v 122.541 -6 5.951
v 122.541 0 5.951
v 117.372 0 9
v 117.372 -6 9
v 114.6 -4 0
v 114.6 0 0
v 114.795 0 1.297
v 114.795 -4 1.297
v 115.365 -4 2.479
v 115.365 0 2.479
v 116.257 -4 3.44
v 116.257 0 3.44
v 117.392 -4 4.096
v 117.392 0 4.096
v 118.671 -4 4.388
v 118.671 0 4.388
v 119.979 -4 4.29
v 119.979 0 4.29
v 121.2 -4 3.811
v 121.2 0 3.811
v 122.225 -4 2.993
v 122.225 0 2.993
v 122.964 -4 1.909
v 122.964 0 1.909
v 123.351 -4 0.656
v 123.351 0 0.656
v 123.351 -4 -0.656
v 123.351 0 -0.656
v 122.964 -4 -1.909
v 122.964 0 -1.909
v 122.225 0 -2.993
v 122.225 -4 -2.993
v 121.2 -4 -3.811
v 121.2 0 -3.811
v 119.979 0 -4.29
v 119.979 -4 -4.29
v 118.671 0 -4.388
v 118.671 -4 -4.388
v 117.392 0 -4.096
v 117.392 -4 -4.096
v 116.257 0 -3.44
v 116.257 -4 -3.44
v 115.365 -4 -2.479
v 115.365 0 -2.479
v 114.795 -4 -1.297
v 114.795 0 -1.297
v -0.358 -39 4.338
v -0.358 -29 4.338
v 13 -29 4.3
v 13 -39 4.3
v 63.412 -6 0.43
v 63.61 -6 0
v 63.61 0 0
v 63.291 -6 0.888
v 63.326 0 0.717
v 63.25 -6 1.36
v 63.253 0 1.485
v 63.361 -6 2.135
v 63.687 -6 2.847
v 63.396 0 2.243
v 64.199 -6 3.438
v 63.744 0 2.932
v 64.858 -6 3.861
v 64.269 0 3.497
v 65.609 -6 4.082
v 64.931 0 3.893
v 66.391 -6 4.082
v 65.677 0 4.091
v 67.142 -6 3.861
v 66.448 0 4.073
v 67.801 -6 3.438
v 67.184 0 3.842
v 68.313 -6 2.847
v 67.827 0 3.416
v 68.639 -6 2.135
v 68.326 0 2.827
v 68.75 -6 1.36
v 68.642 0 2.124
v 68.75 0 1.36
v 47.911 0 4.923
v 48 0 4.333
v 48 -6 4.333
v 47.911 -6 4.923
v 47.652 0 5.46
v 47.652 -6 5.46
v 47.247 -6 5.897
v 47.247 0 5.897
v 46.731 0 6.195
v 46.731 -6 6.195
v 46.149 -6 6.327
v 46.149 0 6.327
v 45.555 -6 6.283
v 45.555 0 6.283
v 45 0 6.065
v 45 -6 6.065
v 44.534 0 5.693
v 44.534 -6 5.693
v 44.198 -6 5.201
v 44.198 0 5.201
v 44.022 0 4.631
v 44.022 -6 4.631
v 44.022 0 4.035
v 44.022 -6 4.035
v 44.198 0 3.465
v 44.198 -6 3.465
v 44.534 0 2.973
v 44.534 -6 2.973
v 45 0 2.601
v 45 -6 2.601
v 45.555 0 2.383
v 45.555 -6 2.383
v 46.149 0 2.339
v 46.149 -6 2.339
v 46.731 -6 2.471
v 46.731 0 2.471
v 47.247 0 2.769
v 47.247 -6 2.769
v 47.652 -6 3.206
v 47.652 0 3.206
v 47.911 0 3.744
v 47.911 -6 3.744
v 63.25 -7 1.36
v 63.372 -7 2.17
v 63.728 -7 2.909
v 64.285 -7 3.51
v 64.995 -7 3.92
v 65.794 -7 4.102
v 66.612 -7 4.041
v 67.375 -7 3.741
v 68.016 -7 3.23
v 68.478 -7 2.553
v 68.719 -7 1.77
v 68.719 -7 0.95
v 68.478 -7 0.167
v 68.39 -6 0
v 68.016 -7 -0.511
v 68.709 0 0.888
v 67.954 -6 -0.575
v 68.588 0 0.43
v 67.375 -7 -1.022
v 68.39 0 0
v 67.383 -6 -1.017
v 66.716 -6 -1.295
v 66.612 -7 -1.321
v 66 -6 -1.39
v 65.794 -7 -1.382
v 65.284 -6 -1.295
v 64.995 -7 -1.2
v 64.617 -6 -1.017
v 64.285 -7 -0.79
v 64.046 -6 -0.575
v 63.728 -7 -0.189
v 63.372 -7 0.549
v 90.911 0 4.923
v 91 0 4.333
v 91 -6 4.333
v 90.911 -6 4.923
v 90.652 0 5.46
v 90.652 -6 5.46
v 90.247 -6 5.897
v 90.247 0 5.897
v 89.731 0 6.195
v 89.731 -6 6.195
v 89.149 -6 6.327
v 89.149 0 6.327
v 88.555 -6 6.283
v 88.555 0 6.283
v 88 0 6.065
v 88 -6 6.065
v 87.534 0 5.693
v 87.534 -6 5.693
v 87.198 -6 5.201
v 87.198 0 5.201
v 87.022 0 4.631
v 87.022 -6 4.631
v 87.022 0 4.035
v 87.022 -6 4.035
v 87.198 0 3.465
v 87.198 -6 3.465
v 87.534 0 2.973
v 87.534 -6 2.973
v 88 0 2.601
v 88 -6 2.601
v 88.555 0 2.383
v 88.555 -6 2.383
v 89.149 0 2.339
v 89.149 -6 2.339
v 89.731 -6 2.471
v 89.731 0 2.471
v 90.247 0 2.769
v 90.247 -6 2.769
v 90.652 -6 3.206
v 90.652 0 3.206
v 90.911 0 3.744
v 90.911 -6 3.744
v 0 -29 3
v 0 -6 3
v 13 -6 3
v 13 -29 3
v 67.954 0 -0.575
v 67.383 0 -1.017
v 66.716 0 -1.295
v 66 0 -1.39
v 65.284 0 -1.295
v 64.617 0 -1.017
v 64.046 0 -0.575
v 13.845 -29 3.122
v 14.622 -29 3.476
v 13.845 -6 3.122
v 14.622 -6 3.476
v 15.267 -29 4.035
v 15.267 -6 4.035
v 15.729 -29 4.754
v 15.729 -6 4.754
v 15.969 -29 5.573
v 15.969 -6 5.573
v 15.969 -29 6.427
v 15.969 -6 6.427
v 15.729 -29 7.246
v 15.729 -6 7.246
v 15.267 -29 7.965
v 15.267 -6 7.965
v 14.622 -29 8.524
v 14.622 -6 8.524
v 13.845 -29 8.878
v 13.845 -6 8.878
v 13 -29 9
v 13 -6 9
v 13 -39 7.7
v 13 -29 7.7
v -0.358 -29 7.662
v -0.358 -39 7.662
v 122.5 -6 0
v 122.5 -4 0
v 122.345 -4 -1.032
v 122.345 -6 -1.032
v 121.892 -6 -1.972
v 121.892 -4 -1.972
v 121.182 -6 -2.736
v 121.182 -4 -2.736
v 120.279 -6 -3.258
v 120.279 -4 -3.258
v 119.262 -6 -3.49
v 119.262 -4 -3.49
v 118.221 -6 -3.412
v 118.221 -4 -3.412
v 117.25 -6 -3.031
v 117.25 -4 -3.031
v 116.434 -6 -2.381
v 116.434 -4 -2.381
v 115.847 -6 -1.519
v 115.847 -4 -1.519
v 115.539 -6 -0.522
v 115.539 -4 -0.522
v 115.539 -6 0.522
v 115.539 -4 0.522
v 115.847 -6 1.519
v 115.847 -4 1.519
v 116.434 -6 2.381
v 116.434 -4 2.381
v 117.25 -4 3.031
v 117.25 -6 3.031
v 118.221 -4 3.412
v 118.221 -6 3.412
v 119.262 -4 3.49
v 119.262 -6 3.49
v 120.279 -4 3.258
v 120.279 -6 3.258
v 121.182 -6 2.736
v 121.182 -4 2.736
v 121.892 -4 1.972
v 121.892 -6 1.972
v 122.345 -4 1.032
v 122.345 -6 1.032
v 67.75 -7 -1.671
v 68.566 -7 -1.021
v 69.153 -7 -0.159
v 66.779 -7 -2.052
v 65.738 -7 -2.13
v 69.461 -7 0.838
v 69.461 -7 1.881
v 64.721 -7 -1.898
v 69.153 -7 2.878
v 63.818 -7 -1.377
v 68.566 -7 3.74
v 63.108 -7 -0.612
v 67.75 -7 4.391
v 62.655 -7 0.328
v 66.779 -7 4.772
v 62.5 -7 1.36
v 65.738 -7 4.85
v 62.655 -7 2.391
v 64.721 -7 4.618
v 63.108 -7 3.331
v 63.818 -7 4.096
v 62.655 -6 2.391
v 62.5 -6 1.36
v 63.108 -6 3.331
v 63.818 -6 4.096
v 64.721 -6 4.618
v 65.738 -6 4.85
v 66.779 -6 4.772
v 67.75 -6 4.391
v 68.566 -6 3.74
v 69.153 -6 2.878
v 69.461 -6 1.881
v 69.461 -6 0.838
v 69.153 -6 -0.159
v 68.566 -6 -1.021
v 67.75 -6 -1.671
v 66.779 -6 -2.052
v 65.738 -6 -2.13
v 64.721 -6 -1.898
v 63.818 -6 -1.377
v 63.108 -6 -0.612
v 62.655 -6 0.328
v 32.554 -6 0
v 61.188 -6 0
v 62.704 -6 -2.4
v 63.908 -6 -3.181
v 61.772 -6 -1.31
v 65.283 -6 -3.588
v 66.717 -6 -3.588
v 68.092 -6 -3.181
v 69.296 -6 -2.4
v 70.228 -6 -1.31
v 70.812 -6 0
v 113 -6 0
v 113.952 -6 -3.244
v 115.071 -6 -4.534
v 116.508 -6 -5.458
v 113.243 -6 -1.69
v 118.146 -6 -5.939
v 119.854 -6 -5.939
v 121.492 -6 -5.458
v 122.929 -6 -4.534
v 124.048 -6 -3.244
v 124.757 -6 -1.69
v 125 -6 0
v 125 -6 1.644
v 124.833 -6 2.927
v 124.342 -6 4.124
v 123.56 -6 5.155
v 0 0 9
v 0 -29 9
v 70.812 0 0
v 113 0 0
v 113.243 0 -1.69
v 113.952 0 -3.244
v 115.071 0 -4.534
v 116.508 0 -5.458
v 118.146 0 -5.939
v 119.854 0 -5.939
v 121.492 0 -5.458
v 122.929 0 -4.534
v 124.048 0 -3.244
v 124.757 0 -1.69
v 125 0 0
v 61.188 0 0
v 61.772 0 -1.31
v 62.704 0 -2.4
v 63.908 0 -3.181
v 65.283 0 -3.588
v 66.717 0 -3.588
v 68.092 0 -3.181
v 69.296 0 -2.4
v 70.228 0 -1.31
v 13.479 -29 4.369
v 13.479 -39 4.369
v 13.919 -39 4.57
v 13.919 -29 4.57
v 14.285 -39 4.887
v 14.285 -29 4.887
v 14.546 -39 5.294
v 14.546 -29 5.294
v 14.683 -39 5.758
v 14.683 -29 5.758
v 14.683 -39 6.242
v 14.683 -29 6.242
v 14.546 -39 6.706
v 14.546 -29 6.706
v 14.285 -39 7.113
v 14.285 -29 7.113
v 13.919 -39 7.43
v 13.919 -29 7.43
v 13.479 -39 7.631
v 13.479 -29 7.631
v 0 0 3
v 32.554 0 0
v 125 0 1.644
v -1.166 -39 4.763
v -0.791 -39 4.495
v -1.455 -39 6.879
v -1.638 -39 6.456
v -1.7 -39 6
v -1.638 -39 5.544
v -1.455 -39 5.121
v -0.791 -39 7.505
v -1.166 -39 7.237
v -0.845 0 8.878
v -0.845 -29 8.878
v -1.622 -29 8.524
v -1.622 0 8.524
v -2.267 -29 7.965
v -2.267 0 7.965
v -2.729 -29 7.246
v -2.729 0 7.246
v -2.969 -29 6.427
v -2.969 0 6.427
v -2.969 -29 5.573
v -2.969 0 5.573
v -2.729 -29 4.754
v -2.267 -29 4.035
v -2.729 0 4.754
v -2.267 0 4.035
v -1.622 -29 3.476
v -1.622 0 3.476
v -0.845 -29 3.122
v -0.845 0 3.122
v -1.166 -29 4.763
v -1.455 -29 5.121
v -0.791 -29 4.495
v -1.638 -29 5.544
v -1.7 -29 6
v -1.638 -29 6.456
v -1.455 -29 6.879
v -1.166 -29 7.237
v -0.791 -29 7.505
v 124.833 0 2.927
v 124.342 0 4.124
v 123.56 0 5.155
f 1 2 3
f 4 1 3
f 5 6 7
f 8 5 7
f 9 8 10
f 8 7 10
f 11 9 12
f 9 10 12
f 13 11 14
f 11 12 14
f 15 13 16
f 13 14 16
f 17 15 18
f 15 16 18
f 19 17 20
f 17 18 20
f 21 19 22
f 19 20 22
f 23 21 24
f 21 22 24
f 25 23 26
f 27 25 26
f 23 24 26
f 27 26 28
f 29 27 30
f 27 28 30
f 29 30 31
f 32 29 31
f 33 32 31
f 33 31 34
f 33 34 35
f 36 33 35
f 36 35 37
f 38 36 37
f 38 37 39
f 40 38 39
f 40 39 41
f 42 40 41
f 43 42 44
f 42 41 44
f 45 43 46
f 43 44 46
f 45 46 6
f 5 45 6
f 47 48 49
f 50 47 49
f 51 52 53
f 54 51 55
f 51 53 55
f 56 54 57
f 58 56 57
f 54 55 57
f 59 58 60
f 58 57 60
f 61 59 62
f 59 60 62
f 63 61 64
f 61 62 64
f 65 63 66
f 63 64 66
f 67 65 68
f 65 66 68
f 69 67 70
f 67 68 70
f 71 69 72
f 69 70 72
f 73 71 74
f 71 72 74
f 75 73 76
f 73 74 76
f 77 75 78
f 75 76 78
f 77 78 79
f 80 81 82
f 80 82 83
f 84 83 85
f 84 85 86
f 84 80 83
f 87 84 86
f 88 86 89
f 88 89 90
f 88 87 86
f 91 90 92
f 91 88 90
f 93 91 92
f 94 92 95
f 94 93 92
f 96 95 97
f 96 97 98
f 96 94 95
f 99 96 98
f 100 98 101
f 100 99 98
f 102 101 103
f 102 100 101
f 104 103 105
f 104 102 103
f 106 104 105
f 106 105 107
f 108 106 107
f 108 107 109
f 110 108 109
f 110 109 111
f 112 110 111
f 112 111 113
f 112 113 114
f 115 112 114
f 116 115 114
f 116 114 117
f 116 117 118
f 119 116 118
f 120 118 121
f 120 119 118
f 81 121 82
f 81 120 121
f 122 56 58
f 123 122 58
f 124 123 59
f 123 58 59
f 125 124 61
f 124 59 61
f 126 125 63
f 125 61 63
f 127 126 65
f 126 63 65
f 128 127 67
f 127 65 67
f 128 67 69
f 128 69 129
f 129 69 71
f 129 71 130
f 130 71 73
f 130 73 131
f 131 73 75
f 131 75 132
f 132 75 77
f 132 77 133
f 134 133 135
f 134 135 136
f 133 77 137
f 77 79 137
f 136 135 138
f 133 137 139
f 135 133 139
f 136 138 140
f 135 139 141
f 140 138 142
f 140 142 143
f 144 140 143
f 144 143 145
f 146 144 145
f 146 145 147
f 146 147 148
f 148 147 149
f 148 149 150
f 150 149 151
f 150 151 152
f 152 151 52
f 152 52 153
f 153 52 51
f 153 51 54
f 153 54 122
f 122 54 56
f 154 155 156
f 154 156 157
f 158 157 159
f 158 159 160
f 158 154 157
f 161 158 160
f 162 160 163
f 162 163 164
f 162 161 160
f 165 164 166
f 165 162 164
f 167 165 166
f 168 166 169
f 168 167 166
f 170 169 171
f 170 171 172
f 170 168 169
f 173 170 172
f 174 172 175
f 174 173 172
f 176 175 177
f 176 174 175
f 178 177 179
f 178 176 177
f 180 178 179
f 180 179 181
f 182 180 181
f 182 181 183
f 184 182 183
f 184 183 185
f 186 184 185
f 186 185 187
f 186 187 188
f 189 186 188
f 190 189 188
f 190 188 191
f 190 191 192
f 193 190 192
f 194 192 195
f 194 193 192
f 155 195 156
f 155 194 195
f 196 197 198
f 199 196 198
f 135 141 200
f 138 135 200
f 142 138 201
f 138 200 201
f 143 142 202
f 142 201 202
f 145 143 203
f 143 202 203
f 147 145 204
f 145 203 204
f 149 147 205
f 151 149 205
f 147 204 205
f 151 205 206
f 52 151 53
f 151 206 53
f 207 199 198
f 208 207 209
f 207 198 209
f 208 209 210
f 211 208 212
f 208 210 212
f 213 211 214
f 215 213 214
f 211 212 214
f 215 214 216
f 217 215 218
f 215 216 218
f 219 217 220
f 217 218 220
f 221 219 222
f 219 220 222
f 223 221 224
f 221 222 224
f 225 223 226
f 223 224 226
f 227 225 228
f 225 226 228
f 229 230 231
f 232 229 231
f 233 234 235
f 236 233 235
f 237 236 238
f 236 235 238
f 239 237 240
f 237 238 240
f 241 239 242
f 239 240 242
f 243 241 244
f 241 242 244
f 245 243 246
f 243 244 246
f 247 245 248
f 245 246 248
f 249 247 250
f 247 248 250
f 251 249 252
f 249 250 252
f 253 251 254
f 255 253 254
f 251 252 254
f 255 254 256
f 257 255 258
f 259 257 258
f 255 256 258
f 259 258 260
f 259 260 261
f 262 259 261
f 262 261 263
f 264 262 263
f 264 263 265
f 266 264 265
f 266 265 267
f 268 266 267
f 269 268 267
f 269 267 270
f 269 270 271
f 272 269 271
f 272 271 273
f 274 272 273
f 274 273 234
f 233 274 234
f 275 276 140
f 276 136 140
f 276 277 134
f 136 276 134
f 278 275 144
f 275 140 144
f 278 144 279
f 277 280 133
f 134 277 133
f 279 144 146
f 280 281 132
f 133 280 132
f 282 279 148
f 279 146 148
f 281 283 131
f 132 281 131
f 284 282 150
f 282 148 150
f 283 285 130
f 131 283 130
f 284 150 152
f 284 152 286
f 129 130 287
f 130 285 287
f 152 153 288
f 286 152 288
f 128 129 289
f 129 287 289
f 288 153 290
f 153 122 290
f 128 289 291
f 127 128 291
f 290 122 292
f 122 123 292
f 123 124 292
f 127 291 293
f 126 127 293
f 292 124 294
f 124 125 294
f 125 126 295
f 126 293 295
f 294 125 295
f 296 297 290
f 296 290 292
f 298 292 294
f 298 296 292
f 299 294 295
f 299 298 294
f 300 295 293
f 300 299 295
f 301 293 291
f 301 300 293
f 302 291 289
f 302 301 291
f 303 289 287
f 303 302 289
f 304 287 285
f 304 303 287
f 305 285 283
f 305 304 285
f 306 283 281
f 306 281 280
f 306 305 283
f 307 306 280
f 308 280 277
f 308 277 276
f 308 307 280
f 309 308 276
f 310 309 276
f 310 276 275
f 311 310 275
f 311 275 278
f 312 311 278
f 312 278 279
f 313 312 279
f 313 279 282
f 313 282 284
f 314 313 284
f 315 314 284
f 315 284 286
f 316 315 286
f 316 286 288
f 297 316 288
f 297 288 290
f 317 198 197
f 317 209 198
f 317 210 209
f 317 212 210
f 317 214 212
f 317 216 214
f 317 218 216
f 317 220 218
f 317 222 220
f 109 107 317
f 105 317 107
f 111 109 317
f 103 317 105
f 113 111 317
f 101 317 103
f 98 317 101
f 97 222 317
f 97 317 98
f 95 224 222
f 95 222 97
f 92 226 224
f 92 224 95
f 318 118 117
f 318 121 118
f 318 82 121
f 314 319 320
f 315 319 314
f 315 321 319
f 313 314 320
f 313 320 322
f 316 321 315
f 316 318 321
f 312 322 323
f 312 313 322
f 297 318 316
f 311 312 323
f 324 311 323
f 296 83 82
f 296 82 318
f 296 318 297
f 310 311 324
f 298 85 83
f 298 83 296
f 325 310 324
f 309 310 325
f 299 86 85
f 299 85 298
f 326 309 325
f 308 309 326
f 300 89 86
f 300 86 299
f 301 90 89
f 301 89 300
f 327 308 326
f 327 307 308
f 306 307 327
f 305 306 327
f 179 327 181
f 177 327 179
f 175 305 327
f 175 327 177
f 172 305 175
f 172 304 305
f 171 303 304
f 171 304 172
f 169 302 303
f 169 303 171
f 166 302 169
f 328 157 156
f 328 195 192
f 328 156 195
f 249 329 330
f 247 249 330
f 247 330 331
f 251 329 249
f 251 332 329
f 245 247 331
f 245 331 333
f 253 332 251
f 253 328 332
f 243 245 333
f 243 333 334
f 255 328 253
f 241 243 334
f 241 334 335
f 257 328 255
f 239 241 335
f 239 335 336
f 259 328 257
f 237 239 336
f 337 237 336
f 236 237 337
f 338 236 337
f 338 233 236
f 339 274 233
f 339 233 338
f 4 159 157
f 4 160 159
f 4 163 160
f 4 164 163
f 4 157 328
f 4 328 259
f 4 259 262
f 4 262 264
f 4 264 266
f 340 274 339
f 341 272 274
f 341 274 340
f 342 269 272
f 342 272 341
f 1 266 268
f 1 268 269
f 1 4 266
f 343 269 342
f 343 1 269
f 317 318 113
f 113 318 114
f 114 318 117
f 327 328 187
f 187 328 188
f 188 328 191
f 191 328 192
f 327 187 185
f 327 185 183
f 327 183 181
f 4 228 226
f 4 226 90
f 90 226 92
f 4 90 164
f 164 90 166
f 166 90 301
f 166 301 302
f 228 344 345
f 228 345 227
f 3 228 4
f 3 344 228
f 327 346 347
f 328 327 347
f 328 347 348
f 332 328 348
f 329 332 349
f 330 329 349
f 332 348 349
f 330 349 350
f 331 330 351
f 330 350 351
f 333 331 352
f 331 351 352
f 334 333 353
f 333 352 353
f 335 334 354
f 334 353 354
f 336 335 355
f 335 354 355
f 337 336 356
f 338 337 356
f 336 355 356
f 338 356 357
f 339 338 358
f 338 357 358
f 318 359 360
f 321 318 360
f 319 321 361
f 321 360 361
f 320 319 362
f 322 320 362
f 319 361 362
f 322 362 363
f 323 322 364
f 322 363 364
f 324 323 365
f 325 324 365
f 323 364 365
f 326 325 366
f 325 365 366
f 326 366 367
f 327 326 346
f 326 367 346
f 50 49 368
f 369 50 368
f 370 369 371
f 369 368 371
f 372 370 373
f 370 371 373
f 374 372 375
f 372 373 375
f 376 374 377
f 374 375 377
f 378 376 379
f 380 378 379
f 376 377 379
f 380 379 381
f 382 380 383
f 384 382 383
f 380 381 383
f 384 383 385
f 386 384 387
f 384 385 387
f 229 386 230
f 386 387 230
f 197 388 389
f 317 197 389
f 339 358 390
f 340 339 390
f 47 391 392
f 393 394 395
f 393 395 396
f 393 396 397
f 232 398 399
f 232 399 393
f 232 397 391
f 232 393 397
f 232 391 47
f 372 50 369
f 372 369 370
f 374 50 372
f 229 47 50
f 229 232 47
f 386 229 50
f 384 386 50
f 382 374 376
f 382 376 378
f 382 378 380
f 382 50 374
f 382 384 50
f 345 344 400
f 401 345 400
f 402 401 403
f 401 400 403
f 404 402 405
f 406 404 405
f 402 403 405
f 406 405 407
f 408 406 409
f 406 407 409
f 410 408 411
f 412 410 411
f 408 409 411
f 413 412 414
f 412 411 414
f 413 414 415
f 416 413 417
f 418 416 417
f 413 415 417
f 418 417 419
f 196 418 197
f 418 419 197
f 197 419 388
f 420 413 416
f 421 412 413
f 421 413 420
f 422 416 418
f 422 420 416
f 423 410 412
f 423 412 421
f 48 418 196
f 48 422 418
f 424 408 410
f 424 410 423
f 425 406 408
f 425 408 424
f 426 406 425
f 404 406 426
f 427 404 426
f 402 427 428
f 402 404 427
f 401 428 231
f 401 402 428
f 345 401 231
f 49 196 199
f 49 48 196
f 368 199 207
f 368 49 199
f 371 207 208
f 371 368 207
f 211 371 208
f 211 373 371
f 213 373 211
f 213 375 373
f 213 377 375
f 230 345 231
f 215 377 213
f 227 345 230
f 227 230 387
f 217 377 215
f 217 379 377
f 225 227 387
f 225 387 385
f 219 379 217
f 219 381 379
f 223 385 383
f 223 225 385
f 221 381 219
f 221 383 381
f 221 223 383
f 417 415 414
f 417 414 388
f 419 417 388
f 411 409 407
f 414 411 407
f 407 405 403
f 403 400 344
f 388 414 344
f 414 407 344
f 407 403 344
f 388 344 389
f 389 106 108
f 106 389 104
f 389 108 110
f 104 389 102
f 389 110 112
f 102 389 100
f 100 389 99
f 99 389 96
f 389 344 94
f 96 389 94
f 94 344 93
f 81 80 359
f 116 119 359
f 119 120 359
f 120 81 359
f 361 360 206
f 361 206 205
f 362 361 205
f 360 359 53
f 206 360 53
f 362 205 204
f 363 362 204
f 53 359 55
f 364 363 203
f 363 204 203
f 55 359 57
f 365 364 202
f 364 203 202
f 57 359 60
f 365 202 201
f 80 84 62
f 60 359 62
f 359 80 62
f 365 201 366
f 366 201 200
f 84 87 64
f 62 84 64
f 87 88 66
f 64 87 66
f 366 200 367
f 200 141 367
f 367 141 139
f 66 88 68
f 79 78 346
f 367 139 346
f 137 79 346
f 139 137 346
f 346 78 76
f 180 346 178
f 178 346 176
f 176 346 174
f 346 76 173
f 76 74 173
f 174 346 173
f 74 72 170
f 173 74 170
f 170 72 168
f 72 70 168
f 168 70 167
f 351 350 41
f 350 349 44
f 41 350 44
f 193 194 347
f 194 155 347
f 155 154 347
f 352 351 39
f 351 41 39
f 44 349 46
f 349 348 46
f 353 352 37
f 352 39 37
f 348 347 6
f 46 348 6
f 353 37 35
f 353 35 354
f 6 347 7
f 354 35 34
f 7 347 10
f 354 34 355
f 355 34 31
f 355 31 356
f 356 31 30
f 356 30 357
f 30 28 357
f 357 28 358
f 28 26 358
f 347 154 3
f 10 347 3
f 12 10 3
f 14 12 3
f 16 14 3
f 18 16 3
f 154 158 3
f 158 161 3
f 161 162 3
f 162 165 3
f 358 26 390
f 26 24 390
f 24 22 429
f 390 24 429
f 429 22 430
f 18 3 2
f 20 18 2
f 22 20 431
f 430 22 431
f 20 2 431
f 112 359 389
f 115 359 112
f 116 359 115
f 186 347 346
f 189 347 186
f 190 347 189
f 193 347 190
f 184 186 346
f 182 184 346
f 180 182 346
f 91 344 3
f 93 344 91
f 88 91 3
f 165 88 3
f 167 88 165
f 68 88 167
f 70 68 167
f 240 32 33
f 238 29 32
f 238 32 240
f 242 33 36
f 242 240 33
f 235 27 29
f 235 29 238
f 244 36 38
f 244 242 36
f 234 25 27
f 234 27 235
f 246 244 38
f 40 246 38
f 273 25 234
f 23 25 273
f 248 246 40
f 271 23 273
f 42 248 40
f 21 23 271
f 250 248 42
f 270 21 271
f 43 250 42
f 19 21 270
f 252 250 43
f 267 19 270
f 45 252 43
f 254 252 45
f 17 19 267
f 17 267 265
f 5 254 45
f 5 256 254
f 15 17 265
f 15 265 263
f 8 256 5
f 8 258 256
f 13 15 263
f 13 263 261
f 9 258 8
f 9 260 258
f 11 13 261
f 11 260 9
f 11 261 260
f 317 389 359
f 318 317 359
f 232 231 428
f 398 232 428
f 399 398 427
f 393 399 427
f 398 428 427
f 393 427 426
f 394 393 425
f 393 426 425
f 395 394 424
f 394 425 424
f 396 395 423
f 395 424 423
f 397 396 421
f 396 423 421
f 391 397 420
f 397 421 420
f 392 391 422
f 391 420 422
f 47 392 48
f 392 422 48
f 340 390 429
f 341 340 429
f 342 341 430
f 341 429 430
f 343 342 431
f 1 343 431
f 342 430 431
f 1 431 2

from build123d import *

# Parameters (mm, degrees)
F0_R     = 2
F1_DEPTH = 6
F2_R     = 4.4
F3_DEPTH = 4
F4_R     = 3.5
F4_R_2   = 2.75
F5_DEPTH = 7
F6_W     = 13
F6_H     = 6
F7_DEPTH = 23
F9_DEPTH = 10


with BuildPart() as f1:
    # F0 (on Front) → F1 (new body)
    with BuildSketch(Plane.XZ):
        with BuildLine():
            Line((0, 3), (32.554146, 0))
            Line((32.554146, 0), (61.188469, 0))
            Line((61.188469, 0), (63.609742, 0))
            ThreePointArc((63.609742, 0), (65.29669, 4.018384), (68.75, 1.359841))
            ThreePointArc((68.75, 1.359841), (68.658544, 0.65653), (68.390258, 0))
            Line((68.390258, 0), (70.811531, 0))
            Line((70.811531, 0), (113, 0))
            Line((113, 0), (115.5, 0))
            ThreePointArc((115.5, 0), (119, 3.5), (122.5, 0))
            Line((122.5, 0), (125, 0))
            Line((125, 0), (125, 1.644468))
            ThreePointArc((125, 1.644468), (124.341818, 4.124108), (122.540554, 5.950927))
            Line((122.540554, 5.950927), (117.372112, 9))
            Line((117.372112, 9), (0, 9))
            Line((0, 9), (0, 3))
        make_face()
        with Locations((46, 4.333029)):
            Circle(F0_R, mode=Mode.SUBTRACT)
        with Locations((89, 4.333029)):
            Circle(F0_R, mode=Mode.SUBTRACT)
        with BuildLine():
            Line((63.609742, 0), (61.188469, 0))
            ThreePointArc((61.188469, 0), (66, -3.640159), (70.811531, 0))
            Line((70.811531, 0), (68.390258, 0))
            ThreePointArc((68.390258, 0), (66, -1.390159), (63.609742, 0))
        make_face()
        with BuildLine():
            ThreePointArc((0, 9), (-3, 6), (0, 3))
            Line((0, 3), (0, 9))
        make_face()
        with BuildLine():
            Line((115.5, 0), (113, 0))
            ThreePointArc((113, 0), (119, -6), (125, 0))
            Line((125, 0), (122.5, 0))
            ThreePointArc((122.5, 0), (119, -3.5), (115.5, 0))
        make_face()
    extrude(amount=F1_DEPTH)

    # F2 (on face) → F3 (cut)
    with BuildSketch(Plane(origin=(0, 0, 0), x_dir=(-1, 0, 0), z_dir=(0, 1, 0))):
        with Locations((-119, 0)):
            Circle(F2_R)
    extrude(amount=-F3_DEPTH, mode=Mode.SUBTRACT)

    # F4 (on face) → F5 (join)
    with BuildSketch(Plane(origin=(0, 0, 0), x_dir=(-1, 0, 0), z_dir=(0, 1, 0))):
        with Locations((-66, 1.359841)):
            Circle(F4_R)
        with Locations((-66, 1.359841)):
            Circle(F4_R_2, mode=Mode.SUBTRACT)
    extrude(amount=-F5_DEPTH)

    # F6 (on face) → F7 (join)
    with BuildSketch(Plane.XZ.offset(6)):
        with BuildLine():
            Line((0, 3), (0, 9))
            ThreePointArc((0, 9), (-3, 6), (0, 3))
        make_face()
        with Locations((6.5, 6)):
            Rectangle(F6_W, F6_H)
        with BuildLine():
            ThreePointArc((13, 3), (16, 6), (13, 9))
            Line((13, 9), (13, 3))
        make_face()
    extrude(amount=F7_DEPTH)

    # F8 (on face) → F9 (join)
    with BuildSketch(Plane.XZ.offset(29)):
        with BuildLine():
            Line((13, 7.7), (-0.358373, 7.661797))
            ThreePointArc((-0.358373, 7.661797), (-1.7, 6), (-0.358373, 4.338203))
            Line((-0.358373, 4.338203), (13, 4.3))
            ThreePointArc((13, 4.3), (14.7, 6), (13, 7.7))
        make_face()
    extrude(amount=F9_DEPTH)


solid = f1.part
